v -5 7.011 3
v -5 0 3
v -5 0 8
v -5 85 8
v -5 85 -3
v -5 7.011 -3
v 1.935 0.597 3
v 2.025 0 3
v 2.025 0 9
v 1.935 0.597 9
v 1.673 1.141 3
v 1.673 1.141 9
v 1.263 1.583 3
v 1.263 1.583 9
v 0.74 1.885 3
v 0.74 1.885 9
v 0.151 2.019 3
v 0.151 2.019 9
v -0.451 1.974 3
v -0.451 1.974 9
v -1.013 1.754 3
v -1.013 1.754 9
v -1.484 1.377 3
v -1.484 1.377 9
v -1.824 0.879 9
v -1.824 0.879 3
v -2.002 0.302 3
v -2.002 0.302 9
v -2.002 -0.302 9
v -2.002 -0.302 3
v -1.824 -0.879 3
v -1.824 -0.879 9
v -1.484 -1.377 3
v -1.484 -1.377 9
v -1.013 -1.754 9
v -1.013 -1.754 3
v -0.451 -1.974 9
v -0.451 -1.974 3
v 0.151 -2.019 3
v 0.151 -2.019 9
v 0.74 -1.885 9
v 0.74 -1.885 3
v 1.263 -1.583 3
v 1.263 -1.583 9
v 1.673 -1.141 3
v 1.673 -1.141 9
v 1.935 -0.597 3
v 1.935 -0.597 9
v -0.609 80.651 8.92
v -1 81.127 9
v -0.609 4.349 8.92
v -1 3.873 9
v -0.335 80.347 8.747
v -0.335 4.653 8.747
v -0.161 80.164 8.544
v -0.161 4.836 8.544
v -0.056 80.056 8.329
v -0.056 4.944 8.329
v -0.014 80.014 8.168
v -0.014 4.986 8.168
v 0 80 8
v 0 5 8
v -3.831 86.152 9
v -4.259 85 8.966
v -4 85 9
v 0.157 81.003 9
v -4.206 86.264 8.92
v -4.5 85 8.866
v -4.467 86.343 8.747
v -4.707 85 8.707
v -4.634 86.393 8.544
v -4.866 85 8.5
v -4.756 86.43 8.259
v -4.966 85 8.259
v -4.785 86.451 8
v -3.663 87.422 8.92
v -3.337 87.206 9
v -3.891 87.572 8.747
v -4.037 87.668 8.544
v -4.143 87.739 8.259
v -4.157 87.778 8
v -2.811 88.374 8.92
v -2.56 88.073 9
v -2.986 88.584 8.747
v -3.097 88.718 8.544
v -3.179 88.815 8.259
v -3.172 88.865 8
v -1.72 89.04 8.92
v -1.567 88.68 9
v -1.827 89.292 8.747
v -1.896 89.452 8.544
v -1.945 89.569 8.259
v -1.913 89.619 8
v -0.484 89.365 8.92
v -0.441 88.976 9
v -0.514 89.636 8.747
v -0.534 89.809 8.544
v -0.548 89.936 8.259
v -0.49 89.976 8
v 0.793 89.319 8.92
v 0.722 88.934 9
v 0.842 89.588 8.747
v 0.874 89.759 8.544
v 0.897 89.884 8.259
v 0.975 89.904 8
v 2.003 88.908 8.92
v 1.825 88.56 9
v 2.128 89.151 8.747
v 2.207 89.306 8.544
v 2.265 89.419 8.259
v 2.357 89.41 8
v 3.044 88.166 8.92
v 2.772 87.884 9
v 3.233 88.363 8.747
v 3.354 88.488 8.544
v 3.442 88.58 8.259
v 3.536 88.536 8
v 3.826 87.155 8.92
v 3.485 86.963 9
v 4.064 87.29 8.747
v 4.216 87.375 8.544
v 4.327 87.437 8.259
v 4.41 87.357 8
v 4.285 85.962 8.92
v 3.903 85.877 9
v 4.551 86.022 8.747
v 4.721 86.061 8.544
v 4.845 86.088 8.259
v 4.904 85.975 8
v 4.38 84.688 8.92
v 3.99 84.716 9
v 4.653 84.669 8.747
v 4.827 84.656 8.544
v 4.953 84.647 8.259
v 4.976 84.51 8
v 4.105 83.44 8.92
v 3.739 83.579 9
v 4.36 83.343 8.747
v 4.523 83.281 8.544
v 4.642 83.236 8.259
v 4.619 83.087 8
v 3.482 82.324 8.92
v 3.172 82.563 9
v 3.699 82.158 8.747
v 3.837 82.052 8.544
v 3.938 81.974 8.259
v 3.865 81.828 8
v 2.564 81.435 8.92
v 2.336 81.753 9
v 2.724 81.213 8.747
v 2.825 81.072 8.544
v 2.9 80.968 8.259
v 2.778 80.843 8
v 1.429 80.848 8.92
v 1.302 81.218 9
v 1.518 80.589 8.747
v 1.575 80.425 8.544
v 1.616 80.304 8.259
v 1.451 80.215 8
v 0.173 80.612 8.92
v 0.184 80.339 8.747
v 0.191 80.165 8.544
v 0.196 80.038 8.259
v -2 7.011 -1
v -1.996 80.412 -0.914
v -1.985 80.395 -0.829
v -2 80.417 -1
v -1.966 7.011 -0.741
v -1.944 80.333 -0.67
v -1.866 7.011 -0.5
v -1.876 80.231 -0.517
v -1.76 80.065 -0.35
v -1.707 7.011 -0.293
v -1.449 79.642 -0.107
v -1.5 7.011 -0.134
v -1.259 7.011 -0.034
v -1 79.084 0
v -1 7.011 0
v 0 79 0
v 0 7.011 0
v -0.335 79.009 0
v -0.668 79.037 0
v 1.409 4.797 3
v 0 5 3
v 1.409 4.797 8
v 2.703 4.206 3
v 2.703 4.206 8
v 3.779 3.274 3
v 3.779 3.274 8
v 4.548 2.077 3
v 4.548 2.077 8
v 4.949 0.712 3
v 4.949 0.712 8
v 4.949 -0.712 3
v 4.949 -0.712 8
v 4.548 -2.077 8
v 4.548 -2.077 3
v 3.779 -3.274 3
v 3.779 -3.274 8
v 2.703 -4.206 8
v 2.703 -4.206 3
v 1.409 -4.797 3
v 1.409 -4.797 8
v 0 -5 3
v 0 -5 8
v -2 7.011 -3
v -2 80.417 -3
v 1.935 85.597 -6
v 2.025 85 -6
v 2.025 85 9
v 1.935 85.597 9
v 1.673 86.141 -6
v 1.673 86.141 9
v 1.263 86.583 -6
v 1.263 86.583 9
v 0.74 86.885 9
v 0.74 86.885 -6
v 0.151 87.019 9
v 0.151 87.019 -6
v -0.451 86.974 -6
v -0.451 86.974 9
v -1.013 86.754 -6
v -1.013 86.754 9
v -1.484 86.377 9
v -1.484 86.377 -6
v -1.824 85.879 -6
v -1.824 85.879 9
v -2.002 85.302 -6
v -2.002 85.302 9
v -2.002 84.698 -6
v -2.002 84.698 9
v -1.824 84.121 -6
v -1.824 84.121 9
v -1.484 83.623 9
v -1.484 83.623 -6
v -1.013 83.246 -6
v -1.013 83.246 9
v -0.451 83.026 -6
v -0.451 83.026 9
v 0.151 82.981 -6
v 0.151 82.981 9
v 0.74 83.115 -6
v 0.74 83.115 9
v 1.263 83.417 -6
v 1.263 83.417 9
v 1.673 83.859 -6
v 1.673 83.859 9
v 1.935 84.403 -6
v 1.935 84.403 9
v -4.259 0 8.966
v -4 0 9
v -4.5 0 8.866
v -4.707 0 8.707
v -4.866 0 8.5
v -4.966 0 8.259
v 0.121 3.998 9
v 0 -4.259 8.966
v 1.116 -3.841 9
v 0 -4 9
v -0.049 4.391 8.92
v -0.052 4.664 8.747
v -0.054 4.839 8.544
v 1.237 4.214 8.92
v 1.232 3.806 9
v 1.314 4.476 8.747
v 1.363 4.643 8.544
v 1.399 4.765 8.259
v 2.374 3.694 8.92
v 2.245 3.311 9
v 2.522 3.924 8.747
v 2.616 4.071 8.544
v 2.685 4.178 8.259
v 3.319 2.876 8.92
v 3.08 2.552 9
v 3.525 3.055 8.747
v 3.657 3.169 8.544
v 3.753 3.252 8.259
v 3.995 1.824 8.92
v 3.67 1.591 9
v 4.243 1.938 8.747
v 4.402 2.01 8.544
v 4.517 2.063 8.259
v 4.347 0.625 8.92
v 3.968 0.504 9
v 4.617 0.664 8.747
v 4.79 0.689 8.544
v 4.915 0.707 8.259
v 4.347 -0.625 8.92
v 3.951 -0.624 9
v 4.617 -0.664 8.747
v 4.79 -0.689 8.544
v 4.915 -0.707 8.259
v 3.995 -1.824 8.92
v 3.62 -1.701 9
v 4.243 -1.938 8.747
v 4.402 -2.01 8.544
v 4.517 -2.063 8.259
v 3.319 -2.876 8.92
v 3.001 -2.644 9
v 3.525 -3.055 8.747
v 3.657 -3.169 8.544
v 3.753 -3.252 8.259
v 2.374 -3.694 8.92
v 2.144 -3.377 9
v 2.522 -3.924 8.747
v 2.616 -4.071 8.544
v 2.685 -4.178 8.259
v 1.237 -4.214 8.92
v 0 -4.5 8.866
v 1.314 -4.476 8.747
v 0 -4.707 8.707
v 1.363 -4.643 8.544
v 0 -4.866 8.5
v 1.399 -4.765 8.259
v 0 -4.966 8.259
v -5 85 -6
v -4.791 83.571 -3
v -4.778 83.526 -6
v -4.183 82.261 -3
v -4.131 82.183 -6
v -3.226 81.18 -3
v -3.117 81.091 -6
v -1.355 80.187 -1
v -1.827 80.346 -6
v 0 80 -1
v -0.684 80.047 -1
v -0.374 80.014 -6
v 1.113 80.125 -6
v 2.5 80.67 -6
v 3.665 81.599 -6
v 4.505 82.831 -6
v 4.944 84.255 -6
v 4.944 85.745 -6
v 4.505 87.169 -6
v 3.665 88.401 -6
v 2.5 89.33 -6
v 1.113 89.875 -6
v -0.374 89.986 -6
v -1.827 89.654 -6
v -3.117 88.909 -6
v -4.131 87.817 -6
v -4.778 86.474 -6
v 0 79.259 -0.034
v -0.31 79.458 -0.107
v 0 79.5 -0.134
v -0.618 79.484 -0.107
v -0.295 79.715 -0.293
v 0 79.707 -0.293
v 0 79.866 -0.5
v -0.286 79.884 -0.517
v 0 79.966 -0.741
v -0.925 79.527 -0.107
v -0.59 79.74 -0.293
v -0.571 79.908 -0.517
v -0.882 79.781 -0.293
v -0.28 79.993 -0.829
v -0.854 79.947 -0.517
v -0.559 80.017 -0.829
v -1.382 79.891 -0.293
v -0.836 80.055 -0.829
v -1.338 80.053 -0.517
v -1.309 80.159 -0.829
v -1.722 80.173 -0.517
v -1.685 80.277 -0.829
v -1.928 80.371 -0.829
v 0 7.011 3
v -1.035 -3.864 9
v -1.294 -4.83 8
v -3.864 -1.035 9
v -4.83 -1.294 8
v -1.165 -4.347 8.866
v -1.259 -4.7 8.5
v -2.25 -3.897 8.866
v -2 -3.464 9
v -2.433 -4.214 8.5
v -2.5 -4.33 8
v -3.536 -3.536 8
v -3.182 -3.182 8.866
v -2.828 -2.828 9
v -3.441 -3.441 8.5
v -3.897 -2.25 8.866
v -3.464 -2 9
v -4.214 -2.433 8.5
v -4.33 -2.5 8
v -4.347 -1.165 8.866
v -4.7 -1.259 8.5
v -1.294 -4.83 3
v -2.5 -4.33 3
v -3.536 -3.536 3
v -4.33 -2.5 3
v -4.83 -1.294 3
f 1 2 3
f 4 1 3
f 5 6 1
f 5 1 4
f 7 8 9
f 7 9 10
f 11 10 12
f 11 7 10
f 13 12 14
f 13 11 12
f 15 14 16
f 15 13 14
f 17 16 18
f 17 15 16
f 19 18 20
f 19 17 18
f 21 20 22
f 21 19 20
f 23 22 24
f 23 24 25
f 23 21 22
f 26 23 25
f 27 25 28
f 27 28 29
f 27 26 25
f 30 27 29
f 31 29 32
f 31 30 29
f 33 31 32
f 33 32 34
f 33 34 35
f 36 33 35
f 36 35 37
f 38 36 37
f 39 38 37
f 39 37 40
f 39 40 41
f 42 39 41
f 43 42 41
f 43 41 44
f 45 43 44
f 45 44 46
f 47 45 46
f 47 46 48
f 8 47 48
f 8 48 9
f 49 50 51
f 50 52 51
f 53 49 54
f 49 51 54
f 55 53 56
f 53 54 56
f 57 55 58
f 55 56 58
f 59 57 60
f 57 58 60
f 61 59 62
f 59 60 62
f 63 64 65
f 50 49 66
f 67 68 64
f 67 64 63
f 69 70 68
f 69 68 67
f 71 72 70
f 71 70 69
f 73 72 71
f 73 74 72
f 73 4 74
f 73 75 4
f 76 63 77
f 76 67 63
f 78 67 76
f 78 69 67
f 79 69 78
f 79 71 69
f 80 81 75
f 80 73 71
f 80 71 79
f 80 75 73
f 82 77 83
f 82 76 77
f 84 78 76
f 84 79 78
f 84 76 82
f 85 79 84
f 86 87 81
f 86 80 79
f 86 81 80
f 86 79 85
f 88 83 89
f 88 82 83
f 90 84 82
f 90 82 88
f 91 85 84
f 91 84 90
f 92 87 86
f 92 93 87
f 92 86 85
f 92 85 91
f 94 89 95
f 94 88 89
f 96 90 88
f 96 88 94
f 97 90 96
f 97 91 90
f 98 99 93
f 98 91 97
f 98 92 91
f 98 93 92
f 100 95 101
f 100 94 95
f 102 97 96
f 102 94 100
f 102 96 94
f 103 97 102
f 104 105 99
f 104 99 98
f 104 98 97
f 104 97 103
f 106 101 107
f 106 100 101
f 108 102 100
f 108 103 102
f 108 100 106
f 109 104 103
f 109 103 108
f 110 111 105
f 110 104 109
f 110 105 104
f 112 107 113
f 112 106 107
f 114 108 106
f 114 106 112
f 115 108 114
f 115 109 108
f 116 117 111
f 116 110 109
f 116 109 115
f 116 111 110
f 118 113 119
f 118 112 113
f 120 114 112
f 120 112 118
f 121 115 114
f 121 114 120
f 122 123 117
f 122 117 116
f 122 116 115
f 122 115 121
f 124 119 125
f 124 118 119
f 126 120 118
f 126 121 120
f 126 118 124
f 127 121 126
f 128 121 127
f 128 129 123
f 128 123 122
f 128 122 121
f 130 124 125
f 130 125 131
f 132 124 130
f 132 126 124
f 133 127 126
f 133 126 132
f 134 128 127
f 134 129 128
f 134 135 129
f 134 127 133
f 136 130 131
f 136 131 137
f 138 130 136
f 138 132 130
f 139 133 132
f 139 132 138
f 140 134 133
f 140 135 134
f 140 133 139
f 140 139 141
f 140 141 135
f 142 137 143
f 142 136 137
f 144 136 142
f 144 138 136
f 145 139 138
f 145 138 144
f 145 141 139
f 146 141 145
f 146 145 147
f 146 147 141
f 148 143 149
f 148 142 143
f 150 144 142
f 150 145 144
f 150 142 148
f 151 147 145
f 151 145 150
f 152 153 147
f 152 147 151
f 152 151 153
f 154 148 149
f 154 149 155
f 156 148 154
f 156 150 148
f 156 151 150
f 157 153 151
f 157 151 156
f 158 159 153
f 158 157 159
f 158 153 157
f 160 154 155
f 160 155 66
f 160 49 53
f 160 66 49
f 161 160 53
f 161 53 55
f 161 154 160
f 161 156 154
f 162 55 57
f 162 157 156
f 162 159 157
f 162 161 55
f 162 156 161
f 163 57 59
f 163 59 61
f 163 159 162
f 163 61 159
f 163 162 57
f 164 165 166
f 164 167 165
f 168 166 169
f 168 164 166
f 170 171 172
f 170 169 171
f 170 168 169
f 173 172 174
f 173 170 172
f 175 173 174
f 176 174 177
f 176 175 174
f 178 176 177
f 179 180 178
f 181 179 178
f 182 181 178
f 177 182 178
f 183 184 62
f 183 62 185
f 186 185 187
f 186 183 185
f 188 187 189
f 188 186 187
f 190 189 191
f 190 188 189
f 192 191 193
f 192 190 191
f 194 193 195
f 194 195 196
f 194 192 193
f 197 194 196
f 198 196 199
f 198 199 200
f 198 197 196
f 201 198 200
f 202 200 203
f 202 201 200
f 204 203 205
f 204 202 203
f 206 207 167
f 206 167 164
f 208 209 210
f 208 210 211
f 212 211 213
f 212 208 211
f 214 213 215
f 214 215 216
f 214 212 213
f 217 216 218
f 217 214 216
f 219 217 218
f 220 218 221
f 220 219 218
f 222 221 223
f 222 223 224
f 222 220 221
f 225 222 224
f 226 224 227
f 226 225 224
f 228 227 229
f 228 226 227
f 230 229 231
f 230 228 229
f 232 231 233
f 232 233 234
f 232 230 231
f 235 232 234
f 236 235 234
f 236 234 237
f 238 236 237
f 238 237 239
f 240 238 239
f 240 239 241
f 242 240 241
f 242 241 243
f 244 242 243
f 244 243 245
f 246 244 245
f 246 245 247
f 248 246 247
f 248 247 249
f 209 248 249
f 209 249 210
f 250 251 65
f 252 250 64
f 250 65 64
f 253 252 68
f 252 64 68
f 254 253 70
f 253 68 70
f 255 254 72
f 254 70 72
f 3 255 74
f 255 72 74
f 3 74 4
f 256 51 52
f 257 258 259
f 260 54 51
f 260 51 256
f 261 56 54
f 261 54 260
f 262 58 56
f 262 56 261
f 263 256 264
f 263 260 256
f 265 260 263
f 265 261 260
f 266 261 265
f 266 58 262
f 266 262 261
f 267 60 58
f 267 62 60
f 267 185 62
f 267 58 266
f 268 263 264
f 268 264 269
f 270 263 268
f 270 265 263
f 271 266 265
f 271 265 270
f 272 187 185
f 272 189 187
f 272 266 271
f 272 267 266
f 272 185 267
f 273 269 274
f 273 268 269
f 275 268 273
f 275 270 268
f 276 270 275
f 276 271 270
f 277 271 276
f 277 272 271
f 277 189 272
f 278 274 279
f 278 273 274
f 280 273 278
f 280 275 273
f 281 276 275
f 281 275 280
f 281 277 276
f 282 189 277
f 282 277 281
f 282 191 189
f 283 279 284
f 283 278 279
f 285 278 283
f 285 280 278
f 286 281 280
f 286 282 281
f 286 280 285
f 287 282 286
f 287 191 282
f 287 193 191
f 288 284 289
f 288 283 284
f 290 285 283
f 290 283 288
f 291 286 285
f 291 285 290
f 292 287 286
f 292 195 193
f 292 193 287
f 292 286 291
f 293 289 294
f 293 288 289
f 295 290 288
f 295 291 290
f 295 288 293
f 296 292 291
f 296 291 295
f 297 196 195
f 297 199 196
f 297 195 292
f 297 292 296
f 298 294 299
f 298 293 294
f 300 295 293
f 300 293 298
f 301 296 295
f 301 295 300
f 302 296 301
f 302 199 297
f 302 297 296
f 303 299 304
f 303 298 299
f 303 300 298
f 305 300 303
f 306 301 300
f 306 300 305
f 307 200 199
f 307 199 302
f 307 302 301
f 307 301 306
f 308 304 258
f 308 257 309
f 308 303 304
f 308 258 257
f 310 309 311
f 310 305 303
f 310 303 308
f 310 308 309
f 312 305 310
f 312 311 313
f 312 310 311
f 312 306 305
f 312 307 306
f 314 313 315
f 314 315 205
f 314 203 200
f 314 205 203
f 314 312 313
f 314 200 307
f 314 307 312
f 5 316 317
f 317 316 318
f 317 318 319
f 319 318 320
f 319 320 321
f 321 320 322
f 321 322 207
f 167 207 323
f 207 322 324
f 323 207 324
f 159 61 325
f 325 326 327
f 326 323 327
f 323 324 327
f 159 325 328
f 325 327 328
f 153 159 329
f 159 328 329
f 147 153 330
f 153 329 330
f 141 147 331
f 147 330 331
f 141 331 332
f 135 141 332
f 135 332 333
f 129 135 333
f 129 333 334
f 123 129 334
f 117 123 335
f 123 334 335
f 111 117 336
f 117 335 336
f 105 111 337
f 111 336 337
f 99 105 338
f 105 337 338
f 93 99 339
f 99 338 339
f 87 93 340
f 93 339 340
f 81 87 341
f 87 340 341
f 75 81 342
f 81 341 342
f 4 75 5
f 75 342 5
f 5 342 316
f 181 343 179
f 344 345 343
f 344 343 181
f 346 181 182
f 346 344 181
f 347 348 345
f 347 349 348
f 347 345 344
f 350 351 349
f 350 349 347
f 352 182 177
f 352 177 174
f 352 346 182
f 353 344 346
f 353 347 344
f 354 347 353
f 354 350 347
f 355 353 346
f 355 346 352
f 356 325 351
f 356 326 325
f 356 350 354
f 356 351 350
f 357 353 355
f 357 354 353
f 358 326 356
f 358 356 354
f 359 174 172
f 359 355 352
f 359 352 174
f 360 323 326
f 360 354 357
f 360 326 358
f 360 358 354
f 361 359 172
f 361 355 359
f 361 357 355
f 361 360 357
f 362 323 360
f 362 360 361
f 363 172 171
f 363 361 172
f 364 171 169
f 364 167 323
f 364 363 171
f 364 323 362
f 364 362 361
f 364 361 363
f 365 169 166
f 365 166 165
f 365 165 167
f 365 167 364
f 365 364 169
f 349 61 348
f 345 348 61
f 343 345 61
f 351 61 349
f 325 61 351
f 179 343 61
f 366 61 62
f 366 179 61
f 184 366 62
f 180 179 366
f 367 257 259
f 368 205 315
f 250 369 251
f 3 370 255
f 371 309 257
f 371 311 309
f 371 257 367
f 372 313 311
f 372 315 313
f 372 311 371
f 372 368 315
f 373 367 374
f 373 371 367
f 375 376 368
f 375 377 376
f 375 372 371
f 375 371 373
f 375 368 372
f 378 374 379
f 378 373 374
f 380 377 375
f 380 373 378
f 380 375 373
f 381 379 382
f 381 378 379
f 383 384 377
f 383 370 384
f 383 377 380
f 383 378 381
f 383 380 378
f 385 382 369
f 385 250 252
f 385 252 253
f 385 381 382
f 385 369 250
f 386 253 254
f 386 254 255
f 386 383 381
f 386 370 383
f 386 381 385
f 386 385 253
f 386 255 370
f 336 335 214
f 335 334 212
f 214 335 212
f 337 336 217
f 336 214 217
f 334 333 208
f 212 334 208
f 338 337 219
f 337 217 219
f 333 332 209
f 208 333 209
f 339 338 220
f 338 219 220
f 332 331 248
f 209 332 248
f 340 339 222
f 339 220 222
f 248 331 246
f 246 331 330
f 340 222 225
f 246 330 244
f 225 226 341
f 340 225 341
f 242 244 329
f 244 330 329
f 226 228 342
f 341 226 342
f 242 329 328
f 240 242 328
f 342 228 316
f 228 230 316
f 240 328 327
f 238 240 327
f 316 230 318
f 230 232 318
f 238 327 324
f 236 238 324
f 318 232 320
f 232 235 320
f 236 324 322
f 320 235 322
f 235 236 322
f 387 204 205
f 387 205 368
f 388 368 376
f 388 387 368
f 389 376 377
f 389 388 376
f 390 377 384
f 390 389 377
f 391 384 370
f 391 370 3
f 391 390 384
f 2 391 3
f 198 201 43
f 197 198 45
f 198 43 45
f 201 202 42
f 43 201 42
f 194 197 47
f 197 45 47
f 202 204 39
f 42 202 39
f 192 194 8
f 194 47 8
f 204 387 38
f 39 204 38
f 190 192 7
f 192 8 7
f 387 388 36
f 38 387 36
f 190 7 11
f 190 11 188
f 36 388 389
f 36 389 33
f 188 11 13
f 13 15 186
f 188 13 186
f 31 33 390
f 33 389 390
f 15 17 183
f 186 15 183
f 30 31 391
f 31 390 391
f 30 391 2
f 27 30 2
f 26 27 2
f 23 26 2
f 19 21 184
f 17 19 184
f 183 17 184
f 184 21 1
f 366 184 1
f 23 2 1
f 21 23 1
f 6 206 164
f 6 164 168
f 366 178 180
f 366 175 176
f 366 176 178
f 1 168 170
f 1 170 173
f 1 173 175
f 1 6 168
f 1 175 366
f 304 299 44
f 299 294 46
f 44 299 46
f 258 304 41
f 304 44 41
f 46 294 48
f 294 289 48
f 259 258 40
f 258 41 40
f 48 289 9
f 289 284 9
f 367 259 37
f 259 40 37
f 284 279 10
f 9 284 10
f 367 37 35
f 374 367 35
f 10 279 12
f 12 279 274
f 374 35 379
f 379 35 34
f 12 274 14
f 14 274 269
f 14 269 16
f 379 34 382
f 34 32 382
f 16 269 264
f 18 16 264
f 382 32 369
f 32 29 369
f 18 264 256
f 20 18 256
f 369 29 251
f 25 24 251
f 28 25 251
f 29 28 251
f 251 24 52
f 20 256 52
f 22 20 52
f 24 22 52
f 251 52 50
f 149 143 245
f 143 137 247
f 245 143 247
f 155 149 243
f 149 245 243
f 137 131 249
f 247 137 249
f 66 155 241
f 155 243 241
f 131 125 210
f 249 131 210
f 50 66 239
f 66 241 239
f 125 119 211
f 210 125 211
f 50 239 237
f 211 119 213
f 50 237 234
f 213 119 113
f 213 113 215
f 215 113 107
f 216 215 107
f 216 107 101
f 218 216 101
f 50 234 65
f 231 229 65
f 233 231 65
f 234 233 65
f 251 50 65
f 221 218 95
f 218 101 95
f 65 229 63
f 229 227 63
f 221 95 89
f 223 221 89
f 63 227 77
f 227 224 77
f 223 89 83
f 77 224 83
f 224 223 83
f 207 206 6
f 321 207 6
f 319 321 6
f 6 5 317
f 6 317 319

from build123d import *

# Parameters (mm, degrees)
SKETCH1_R             = 2.025
BOSS_EXTRUDE1_DEPTH   = 9
BOSS_EXTRUDE2_START   = -15
SKETCH2_R             = 5
SKETCH2_R_2           = 2.025
BOSS_EXTRUDE2_DEPTH   = 15
BOSS_EXTRUDE3_START   = -12
SKETCH3_R             = 2.025
BOSS_EXTRUDE3_DEPTH   = 12
CROQUIS1_W            = 6
CROQUIS1_H            = 12.01125174
CORTAR_EXTRUIR3_DEPTH = 10
REDONDEO1_R           = 1
REDONDEO2_R           = 1


with BuildPart() as part:
    # Sketch1 → Boss-Extrude1 (new body)
    with BuildSketch(Plane.XY):
        with BuildLine():
            Line((-5, 0), (-5, 85))
            ThreePointArc((-5, 85), (3.535533906, 88.535533906), (0, 80))
            Line((0, 80), (0, 5))
            ThreePointArc((0, 5), (5, 0), (0, -5))
            ThreePointArc((0, -5), (-3.535533906, -3.535533906), (-5, 0))
        make_face()
        with Locations((0, 85)):
            Circle(SKETCH1_R, mode=Mode.SUBTRACT)
        Circle(SKETCH1_R, mode=Mode.SUBTRACT)
    extrude(amount=BOSS_EXTRUDE1_DEPTH)

    # Sketch2 → Boss-Extrude2 (add)
    with BuildSketch(Plane.XY.offset(9).offset(BOSS_EXTRUDE2_START)):
        with Locations(Location((0, 85, 0), (0, 0, 180))):
            Circle(SKETCH2_R)
        with Locations((0, 85)):
            Circle(SKETCH2_R_2, mode=Mode.SUBTRACT)
    extrude(amount=BOSS_EXTRUDE2_DEPTH)

    # Sketch3 → Boss-Extrude3 (add)
    with BuildSketch(Plane.XY.offset(9).offset(BOSS_EXTRUDE3_START)):
        with BuildLine():
            Line((-5, 0), (-5, 85))
            ThreePointArc((-5, 85), (-4.183300133, 82.261387212), (-2, 80.417424305))
            Line((-2, 80.417424305), (-2, 5))
            Line((-2, 5), (0, 5))
            ThreePointArc((0, 5), (5, 0), (0, -5))
            ThreePointArc((0, -5), (-3.535533906, -3.535533906), (-5, 0))
        make_face()
        Circle(SKETCH3_R, mode=Mode.SUBTRACT)
    extrude(amount=BOSS_EXTRUDE3_DEPTH)

    # Croquis1 → Cortar-Extruir3 (cut)
    with BuildSketch(Plane.ZY.offset(5)):
        with Locations((0, 1.00562587)):
            Rectangle(CROQUIS1_W, CROQUIS1_H)
    extrude(amount=-CORTAR_EXTRUIR3_DEPTH, mode=Mode.SUBTRACT)

    # Redondeo1
    redondeo1_edges = [part.edges().sort_by_distance(p)[0] for p in [
        (-1.021548218, 80.105468435, 0),
        (-2, 43.714338023, 0),
    ]]
    fillet(redondeo1_edges, radius=REDONDEO1_R)

    # Redondeo2
    redondeo2_edges = [part.edges().sort_by_distance(p)[0] for p in [
        (0, 42.5, 9),
        (3.535533906, 88.535533906, 9),
        (-5, 42.5, 9),
        (3.535533906, -3.535533906, 9),
    ]]
    fillet(redondeo2_edges, radius=REDONDEO2_R)


solid = part.part
